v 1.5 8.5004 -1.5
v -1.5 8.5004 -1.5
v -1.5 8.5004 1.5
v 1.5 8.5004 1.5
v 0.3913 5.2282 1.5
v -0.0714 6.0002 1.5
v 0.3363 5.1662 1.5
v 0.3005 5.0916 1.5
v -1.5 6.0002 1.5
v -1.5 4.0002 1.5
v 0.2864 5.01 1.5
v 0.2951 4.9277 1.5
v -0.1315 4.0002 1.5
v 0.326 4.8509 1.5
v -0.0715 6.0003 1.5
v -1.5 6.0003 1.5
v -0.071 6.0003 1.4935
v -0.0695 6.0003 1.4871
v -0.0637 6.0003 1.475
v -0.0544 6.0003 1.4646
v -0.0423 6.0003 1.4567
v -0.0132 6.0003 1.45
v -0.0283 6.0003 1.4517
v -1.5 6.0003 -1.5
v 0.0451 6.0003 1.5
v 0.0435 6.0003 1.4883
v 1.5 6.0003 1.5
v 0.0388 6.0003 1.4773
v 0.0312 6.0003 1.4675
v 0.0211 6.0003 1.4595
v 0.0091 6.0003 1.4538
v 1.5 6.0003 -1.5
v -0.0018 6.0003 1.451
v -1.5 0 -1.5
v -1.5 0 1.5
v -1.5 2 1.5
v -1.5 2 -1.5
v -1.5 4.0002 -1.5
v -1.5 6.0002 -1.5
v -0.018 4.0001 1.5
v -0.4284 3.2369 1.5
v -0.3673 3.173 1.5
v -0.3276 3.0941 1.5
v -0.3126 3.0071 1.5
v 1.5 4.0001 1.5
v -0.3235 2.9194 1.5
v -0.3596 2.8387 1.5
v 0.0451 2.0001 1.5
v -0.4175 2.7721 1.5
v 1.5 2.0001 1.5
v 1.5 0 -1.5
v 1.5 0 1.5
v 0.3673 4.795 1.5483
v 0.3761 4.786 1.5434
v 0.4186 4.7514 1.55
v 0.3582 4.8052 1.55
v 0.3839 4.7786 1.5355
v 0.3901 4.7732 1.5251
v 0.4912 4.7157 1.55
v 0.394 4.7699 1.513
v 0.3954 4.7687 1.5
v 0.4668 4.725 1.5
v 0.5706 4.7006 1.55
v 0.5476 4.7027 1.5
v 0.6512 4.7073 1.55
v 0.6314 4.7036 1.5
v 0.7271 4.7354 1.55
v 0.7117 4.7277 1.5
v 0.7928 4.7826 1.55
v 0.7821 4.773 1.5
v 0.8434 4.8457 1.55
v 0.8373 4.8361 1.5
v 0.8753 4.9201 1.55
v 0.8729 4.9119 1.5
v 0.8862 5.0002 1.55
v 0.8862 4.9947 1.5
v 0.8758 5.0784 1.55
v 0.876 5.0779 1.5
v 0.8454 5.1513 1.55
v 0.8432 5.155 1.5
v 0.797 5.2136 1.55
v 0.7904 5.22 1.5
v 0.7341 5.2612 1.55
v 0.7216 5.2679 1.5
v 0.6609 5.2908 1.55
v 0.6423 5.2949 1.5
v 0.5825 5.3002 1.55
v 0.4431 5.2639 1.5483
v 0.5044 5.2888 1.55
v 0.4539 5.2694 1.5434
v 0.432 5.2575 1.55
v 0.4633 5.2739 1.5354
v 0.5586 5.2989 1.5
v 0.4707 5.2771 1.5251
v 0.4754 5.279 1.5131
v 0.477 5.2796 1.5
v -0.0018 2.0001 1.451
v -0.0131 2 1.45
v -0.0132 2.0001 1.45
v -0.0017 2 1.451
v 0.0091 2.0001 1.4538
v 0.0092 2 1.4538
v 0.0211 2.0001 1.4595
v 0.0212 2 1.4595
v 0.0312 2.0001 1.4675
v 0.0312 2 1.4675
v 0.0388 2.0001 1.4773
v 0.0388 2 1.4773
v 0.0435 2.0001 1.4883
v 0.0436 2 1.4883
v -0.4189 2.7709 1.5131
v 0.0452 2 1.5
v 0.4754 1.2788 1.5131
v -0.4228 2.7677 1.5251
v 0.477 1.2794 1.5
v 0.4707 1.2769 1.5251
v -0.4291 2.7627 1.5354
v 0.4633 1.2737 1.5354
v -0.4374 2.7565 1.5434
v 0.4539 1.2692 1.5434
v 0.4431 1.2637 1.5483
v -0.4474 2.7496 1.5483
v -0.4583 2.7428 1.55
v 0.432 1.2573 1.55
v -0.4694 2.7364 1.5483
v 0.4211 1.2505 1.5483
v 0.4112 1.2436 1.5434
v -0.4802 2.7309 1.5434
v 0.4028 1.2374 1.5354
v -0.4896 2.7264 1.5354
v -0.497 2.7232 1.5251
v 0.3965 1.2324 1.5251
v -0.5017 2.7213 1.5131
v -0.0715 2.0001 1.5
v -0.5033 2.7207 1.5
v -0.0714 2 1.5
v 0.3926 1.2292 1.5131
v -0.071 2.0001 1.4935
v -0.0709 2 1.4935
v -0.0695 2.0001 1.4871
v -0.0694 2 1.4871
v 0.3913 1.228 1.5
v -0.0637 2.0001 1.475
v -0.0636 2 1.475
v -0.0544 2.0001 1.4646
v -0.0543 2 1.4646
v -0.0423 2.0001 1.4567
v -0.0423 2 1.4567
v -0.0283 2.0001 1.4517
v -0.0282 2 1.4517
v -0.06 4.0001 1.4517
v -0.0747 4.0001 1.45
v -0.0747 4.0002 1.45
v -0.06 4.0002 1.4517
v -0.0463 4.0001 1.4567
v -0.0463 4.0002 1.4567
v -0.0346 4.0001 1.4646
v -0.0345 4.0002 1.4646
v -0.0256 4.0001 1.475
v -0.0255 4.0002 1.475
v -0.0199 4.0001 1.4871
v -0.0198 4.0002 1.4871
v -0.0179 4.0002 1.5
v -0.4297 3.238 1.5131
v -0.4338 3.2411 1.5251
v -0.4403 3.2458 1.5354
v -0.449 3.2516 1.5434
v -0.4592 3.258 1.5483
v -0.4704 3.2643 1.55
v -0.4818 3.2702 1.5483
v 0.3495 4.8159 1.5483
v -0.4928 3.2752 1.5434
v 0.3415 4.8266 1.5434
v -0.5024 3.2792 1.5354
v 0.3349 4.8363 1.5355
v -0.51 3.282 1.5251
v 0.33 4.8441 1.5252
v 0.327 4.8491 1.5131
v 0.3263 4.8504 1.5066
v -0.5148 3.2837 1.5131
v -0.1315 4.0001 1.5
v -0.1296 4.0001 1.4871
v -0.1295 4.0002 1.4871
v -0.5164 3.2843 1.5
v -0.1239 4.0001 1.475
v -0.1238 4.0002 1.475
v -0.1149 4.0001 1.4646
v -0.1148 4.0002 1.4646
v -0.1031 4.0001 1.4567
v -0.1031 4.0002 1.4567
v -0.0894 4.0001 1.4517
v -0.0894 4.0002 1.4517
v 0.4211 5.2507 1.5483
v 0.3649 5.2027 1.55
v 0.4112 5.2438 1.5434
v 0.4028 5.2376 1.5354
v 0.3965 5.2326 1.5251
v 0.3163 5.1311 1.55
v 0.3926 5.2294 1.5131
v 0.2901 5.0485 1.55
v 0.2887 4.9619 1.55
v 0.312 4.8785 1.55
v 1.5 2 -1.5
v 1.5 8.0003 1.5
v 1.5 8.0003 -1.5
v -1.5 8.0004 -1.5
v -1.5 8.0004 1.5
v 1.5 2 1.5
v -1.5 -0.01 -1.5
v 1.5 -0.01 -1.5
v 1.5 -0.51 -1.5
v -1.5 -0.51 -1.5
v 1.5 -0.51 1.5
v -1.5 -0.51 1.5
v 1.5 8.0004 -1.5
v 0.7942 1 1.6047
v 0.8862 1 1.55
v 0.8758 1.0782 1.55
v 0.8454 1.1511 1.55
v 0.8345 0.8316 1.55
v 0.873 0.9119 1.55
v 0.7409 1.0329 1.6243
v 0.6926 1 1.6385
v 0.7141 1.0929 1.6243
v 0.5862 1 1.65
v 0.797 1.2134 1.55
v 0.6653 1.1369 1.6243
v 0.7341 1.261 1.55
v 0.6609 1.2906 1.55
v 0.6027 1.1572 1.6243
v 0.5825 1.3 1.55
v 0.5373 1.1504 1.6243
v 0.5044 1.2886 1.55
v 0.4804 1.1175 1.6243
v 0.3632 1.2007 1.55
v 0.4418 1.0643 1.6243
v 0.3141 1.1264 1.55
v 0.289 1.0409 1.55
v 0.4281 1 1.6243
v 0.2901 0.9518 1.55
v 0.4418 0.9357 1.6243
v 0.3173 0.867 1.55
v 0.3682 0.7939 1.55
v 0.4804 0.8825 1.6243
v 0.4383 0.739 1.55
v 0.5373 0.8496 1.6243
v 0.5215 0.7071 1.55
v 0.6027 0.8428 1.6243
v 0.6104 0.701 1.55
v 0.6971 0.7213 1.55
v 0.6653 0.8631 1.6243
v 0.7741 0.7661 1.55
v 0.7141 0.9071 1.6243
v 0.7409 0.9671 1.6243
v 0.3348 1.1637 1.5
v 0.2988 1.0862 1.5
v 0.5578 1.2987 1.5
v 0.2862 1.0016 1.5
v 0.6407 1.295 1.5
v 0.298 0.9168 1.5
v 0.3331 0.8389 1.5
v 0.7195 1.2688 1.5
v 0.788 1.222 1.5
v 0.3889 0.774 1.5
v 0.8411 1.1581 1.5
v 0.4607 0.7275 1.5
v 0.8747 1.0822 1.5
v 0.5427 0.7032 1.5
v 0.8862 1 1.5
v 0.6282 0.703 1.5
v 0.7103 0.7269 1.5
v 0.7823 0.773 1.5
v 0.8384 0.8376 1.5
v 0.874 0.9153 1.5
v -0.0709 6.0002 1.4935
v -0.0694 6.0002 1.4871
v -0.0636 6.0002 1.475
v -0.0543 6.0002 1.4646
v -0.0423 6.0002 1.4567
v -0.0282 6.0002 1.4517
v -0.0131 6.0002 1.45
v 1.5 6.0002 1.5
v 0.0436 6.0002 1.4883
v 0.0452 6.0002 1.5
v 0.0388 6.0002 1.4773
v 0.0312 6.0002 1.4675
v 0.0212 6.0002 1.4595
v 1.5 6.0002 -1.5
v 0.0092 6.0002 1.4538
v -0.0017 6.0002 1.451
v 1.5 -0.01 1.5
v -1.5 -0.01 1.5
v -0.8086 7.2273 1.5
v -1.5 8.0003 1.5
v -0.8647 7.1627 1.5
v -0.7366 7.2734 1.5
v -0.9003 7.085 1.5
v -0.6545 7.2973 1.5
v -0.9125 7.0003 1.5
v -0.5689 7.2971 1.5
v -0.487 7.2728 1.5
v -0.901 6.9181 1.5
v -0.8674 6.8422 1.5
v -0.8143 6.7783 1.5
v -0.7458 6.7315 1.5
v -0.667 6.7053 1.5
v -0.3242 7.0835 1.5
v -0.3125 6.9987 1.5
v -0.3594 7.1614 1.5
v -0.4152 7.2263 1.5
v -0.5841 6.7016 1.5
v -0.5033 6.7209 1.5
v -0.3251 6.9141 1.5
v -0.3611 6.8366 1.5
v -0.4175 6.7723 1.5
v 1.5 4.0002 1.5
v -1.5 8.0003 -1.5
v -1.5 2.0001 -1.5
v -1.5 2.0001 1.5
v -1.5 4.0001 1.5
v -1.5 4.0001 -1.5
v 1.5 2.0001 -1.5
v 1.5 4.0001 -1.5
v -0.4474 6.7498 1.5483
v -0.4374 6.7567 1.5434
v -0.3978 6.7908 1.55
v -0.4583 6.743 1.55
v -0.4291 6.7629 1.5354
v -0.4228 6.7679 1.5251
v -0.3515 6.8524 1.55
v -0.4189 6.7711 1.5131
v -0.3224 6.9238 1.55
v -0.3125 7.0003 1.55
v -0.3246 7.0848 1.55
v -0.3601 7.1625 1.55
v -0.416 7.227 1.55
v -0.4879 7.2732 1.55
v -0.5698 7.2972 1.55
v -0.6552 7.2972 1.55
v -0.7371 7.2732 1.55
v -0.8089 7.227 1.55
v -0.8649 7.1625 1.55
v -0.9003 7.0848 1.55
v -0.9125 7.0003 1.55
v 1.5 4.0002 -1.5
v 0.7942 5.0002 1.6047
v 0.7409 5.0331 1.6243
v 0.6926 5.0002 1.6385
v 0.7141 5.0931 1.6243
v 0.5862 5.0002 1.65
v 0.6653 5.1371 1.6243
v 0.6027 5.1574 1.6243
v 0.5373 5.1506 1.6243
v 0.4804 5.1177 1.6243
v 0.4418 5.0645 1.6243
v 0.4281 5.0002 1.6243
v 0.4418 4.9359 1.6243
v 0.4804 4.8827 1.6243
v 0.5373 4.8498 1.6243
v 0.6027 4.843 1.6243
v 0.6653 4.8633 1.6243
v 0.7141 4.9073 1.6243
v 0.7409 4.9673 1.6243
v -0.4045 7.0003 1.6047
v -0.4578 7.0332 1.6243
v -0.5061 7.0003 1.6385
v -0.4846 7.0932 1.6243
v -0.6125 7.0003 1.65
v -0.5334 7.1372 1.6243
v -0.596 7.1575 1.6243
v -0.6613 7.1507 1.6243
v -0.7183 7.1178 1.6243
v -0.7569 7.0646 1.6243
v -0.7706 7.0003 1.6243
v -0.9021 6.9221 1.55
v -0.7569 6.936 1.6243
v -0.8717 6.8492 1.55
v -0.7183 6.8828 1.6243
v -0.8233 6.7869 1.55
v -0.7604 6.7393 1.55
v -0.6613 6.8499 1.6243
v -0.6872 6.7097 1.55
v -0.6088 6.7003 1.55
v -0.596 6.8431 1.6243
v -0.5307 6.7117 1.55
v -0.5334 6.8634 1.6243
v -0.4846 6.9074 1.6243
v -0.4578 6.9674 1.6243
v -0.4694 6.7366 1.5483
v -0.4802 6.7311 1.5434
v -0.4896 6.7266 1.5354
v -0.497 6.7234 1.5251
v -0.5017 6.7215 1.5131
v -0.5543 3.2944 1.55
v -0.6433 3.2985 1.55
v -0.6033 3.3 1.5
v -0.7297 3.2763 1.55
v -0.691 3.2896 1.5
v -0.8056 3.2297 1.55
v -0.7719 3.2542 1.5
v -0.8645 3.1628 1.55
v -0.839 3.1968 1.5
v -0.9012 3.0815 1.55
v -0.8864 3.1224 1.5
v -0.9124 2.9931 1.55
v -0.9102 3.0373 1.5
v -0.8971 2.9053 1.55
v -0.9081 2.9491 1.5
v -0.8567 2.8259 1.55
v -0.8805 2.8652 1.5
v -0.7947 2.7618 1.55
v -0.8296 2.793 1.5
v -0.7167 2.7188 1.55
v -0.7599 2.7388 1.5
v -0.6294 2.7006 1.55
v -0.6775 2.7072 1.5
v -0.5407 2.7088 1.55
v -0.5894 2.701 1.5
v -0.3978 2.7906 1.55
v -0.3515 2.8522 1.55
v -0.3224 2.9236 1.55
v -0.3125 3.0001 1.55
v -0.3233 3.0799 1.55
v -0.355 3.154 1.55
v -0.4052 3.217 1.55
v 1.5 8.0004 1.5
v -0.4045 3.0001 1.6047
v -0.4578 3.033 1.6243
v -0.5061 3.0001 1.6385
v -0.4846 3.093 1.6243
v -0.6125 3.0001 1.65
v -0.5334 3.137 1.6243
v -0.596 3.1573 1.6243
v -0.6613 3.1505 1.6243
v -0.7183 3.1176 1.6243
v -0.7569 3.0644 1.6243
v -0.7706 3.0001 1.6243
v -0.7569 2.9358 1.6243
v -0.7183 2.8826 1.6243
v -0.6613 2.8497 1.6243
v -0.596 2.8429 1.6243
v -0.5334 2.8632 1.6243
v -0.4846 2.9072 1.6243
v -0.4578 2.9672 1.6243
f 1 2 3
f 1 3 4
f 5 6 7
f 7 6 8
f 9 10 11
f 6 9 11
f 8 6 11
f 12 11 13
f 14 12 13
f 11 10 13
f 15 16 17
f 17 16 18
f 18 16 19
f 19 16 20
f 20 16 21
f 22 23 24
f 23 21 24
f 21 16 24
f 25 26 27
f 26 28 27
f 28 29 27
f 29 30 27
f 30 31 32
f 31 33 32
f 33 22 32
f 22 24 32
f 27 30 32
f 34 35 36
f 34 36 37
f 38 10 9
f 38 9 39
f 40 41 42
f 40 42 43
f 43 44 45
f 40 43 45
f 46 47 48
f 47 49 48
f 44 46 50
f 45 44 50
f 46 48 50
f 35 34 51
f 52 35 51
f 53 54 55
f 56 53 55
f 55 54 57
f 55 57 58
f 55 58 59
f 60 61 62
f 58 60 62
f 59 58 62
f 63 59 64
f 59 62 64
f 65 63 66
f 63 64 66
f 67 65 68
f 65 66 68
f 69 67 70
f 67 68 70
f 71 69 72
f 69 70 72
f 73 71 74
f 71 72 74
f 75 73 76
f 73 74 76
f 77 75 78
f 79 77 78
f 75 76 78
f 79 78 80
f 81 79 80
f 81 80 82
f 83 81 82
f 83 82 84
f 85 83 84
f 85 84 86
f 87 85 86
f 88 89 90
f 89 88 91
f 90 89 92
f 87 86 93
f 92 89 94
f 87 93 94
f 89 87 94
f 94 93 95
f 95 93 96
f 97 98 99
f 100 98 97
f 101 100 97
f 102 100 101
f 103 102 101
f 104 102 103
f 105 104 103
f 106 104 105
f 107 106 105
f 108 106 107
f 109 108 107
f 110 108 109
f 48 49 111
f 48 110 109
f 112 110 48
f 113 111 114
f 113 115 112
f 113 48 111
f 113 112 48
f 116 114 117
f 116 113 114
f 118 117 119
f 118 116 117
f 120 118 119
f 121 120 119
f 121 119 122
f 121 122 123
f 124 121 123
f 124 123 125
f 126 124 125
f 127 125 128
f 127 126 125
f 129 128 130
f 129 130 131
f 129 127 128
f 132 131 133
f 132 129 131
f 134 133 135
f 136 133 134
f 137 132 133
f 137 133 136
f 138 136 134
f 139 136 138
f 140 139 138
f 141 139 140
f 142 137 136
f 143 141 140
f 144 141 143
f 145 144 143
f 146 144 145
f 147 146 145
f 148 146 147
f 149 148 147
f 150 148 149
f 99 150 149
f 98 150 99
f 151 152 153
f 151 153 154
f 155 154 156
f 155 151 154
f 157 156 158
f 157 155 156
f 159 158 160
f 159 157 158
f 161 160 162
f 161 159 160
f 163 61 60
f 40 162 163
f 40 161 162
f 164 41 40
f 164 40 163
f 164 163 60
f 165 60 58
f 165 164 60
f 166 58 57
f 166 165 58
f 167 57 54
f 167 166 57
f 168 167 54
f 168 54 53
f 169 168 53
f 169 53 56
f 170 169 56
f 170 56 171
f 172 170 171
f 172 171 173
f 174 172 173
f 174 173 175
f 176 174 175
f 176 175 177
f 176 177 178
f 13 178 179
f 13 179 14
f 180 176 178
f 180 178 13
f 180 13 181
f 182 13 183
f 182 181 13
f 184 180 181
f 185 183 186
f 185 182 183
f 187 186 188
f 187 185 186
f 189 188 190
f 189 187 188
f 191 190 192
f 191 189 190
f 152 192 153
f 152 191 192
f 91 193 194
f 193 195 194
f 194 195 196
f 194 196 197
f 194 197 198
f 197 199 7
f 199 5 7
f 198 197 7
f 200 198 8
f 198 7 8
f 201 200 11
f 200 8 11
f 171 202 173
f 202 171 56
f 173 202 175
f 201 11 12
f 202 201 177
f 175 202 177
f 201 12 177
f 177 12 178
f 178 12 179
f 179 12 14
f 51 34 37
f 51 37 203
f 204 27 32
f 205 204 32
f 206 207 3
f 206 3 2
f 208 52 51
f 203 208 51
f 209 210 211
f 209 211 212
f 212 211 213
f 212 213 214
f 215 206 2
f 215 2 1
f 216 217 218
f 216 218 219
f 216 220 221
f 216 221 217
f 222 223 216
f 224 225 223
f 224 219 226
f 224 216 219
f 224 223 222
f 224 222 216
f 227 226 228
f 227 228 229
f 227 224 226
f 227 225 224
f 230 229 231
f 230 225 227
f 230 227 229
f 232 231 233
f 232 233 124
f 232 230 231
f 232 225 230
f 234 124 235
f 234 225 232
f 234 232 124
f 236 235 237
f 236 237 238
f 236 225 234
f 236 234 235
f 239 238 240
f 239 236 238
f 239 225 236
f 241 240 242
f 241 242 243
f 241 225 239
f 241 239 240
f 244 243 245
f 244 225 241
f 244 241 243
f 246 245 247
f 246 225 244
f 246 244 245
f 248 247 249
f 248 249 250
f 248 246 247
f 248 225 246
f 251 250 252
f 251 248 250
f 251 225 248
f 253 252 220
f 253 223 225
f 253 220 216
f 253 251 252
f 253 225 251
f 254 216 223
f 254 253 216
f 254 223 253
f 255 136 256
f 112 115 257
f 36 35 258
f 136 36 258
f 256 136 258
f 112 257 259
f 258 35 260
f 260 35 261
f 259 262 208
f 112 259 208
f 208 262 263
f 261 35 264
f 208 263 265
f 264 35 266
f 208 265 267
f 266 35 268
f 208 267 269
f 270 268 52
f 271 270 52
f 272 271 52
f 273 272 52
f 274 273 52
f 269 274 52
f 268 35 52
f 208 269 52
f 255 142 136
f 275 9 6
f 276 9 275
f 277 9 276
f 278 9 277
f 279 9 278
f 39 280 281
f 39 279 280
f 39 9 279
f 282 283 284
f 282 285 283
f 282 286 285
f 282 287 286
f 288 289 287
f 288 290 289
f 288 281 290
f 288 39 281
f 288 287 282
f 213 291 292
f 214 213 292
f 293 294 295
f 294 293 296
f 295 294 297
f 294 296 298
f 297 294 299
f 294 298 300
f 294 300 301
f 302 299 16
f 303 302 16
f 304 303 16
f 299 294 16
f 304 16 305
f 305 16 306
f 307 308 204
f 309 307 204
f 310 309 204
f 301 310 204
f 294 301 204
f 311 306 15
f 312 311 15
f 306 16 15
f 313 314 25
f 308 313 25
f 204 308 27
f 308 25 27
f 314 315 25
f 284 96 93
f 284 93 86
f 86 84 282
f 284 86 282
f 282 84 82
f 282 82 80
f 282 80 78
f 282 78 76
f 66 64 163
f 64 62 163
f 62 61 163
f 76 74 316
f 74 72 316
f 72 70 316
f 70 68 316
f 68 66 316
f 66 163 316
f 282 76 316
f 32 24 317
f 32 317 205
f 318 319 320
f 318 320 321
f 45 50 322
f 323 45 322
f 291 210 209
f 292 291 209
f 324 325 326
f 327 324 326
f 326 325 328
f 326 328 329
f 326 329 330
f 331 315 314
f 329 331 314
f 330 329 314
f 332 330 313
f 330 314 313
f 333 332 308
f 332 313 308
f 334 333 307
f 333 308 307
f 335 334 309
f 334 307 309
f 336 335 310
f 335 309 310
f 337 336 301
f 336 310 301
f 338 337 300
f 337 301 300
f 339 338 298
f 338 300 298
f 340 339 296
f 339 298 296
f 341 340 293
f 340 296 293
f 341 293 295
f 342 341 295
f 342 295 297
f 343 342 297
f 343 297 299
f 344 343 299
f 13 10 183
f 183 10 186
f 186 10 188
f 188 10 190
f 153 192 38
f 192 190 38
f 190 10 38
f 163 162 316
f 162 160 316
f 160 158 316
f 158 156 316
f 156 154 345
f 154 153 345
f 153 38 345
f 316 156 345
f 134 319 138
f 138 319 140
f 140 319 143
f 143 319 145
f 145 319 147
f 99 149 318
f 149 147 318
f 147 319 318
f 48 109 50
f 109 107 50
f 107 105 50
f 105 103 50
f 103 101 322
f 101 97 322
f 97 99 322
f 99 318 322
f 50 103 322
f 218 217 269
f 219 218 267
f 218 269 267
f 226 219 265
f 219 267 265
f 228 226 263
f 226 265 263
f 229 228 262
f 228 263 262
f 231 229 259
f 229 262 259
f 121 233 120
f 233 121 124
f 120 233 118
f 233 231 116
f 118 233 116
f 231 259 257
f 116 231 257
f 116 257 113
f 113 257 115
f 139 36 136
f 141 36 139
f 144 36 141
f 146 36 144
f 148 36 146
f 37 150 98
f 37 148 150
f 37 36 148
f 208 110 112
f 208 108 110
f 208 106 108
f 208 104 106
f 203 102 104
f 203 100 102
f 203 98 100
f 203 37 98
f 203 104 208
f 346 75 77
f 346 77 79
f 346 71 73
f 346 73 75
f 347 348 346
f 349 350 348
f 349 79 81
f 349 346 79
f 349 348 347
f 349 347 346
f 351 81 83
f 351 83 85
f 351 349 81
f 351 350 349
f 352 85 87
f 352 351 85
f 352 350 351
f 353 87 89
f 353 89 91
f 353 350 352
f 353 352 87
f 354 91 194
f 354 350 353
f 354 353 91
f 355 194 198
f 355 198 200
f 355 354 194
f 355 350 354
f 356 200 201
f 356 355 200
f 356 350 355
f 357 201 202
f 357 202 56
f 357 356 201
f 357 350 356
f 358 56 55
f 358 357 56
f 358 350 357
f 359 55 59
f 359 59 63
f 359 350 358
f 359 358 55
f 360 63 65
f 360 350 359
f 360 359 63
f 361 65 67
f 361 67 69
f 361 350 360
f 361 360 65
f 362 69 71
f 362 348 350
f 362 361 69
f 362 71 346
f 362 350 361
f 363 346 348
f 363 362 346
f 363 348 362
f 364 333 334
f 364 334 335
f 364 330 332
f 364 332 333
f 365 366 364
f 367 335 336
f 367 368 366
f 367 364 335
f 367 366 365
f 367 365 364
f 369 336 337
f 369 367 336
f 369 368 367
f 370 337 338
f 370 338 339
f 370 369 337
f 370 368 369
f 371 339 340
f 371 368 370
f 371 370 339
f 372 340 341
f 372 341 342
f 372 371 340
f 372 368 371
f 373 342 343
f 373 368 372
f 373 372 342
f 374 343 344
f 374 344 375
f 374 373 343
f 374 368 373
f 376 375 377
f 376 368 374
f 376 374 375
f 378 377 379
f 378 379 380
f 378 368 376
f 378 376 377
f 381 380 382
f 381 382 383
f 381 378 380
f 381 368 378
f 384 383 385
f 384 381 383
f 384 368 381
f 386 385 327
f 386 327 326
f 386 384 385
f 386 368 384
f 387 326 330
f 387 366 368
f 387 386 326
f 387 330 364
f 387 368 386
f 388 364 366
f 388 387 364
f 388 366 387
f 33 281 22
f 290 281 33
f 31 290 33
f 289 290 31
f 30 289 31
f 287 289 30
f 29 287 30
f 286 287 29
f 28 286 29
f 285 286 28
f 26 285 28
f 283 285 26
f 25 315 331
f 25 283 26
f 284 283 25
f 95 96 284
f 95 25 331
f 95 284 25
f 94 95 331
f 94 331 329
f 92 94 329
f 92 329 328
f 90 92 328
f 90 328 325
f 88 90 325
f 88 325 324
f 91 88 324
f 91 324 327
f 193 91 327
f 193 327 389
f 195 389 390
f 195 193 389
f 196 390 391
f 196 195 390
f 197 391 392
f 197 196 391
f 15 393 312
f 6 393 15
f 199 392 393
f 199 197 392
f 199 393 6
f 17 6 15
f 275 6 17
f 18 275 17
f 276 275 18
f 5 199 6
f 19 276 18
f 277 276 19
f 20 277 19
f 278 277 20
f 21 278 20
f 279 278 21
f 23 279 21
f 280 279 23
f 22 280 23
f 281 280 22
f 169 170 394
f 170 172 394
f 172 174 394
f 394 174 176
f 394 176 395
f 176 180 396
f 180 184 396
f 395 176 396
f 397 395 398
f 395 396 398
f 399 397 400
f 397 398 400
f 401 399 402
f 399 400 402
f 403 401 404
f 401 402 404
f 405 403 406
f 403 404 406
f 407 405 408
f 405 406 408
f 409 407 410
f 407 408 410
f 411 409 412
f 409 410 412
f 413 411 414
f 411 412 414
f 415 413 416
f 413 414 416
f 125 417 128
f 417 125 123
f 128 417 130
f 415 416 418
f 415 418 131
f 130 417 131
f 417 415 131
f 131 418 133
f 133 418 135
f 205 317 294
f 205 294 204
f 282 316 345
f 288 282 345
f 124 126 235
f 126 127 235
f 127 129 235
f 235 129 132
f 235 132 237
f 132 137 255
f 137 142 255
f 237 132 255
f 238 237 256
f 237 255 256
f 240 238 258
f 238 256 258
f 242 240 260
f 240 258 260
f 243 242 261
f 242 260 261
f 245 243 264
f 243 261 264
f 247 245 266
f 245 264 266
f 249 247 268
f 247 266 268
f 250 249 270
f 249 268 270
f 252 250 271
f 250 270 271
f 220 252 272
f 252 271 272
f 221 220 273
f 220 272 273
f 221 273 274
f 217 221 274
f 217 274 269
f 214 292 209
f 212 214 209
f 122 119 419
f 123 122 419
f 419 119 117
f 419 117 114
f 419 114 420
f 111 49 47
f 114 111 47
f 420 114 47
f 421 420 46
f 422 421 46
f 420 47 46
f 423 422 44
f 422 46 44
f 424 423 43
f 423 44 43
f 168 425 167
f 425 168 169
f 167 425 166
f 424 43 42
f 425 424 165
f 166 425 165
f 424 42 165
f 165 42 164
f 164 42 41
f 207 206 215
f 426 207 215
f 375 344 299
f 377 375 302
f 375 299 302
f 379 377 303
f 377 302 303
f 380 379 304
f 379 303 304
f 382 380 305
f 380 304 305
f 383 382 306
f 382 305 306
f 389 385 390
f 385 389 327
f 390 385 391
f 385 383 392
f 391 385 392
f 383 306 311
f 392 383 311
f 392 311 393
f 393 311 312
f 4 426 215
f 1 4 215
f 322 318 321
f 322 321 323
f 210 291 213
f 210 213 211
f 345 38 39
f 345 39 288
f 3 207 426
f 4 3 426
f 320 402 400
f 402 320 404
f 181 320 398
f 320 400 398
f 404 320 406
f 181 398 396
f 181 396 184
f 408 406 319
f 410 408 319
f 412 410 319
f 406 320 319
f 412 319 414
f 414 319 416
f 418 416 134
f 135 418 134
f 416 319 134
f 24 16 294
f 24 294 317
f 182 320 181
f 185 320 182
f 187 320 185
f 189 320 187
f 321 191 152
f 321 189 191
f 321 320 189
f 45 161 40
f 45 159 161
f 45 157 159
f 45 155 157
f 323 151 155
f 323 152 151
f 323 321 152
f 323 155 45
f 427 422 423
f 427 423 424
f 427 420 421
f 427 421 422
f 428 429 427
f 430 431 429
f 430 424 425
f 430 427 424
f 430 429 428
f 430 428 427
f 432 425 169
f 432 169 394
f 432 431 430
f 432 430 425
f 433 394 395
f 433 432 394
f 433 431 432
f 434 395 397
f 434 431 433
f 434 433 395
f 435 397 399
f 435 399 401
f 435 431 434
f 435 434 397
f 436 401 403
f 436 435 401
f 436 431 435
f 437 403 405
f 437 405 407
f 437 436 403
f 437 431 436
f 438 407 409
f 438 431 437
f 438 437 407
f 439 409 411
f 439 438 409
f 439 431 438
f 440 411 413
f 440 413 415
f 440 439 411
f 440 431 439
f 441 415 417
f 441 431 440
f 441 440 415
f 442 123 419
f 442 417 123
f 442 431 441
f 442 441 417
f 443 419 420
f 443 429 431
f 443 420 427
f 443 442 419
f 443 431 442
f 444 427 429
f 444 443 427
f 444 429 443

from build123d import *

# Parameters (mm, degrees)
SKETCH1_W           = 3
SKETCH1_H           = 3
BOSS_EXTRUDE1_DEPTH = 2
LPATTERN3_COUNT     = 4
LPATTERN3_PITCH     = 2.0001
SKETCH2_W           = 3
SKETCH2_H           = 3
BOSS_EXTRUDE2_DEPTH = 0.5
SKETCH7_R           = 0.3
BOSS_EXTRUDE6_DEPTH = 0.05
DOME1_FACE_RADIUS   = 0.3
DOME1_HEIGHT        = 0.1
DOME5_FACE_RADIUS   = 0.3
DOME5_HEIGHT        = 0.1
DOME6_FACE_RADIUS   = 0.3
DOME6_HEIGHT        = 0.1
DOME7_FACE_RADIUS   = 0.3
DOME7_HEIGHT        = 0.1
SKETCH9_R           = 0.05
SKETCH34_W          = 3
SKETCH34_H          = 3
BOSS_EXTRUDE7_DEPTH = 0.5


with BuildPart() as part:
    # Sketch1 → Boss-Extrude1 (new body)
    with BuildSketch(Plane(origin=(0, 0, 0), x_dir=(1, 0, 0), z_dir=(0, 1, 0))):
        Rectangle(SKETCH1_W, SKETCH1_H)
    extrude(amount=BOSS_EXTRUDE1_DEPTH)


with BuildPart() as lpattern3_1:
    # LPattern3: pattern copy
    add(part.part.moved(Location(Vector(0, 1, 0) * (1 * LPATTERN3_PITCH))))


with BuildPart() as lpattern3_2:
    # LPattern3: pattern copy
    add(part.part.moved(Location(Vector(0, 1, 0) * (2 * LPATTERN3_PITCH))))


with BuildPart() as lpattern3_3:
    # LPattern3: pattern copy
    add(part.part.moved(Location(Vector(0, 1, 0) * (3 * LPATTERN3_PITCH))))

    # Sketch7 → Boss-Extrude6 (add)
    with BuildSketch(Plane.XY.offset(1.5)):
        with Locations(Location((-0.612484748, 7.0003, 0), (0, 0, 180))):
            Circle(SKETCH7_R)
        with Locations((0.586205547, 5.0002)):
            Circle(SKETCH7_R)
        with Locations((-0.612484748, 3.0001)):
            Circle(SKETCH7_R)
        with Locations((0.586205547, 1)):
            Circle(SKETCH7_R)
    extrude(amount=BOSS_EXTRUDE6_DEPTH)


with BuildPart() as body_5:
    # Sketch2 → Boss-Extrude2 (new body)
    with BuildSketch(Plane(origin=(0, -0.01, 0), x_dir=(-1, 0, 0), z_dir=(0, -1, 0))):
        Rectangle(SKETCH2_W, SKETCH2_H)
    extrude(amount=BOSS_EXTRUDE2_DEPTH)


with BuildPart() as boss_extrude6_piece_1:
    # of the separate pieces the step leaves, piece 1, a body of its own (boss_extrude6_pieces)
    add(lpattern3_3.part.solids().sort_by_distance((-1.5, 6.0003, -1.5))[0])

    # Dome1: a dome of height H over a round flat face of radius A is a cap of a sphere of radius (A * A + H * H) / (2 * H)
    dome1_r = (DOME1_FACE_RADIUS * DOME1_FACE_RADIUS + DOME1_HEIGHT * DOME1_HEIGHT) / (2 * DOME1_HEIGHT)
    dome1_base = Plane((-0.612484748, 7.0003, 1.55), z_dir=(0, 0, 1))
    with Locations(dome1_base.offset(DOME1_HEIGHT - dome1_r)):
        dome1_ball = Sphere(dome1_r, mode=Mode.PRIVATE)
    add(split(dome1_ball, bisect_by=dome1_base, keep=Keep.TOP, mode=Mode.PRIVATE))


with BuildPart() as boss_extrude6_piece_2:
    # of the separate pieces the step leaves, piece 2, a body of its own (boss_extrude6_pieces)
    add(lpattern3_3.part.solids().sort_by_distance((0.886205547, 5.0002, 1.5))[0])

    # Dome5: a dome of height H over a round flat face of radius A is a cap of a sphere of radius (A * A + H * H) / (2 * H)
    dome5_r = (DOME5_FACE_RADIUS * DOME5_FACE_RADIUS + DOME5_HEIGHT * DOME5_HEIGHT) / (2 * DOME5_HEIGHT)
    dome5_base = Plane((0.586205547, 5.0002, 1.55), z_dir=(0, 0, 1))
    with Locations(dome5_base.offset(DOME5_HEIGHT - dome5_r)):
        dome5_ball = Sphere(dome5_r, mode=Mode.PRIVATE)
    add(split(dome5_ball, bisect_by=dome5_base, keep=Keep.TOP, mode=Mode.PRIVATE))


with BuildPart() as boss_extrude6_piece_3:
    # of the separate pieces the step leaves, piece 3, a body of its own (boss_extrude6_pieces)
    add(lpattern3_3.part.solids().sort_by_distance((0.886205547, 1, 1.5))[0])

    # Dome7: a dome of height H over a round flat face of radius A is a cap of a sphere of radius (A * A + H * H) / (2 * H)
    dome7_r = (DOME7_FACE_RADIUS * DOME7_FACE_RADIUS + DOME7_HEIGHT * DOME7_HEIGHT) / (2 * DOME7_HEIGHT)
    dome7_base = Plane((0.586205547, 1, 1.55), z_dir=(0, 0, 1))
    with Locations(dome7_base.offset(DOME7_HEIGHT - dome7_r)):
        dome7_ball = Sphere(dome7_r, mode=Mode.PRIVATE)
    add(split(dome7_ball, bisect_by=dome7_base, keep=Keep.TOP, mode=Mode.PRIVATE))


with BuildPart() as boss_extrude6_piece_4:
    # of the separate pieces the step leaves, piece 4, a body of its own (boss_extrude6_pieces)
    add(lpattern3_3.part.solids().sort_by_distance((-0.312484748, 3.0001, 1.5))[0])

    # Dome6: a dome of height H over a round flat face of radius A is a cap of a sphere of radius (A * A + H * H) / (2 * H)
    dome6_r = (DOME6_FACE_RADIUS * DOME6_FACE_RADIUS + DOME6_HEIGHT * DOME6_HEIGHT) / (2 * DOME6_HEIGHT)
    dome6_base = Plane((-0.612484748, 3.0001, 1.55), z_dir=(0, 0, 1))
    with Locations(dome6_base.offset(DOME6_HEIGHT - dome6_r)):
        dome6_ball = Sphere(dome6_r, mode=Mode.PRIVATE)
    add(split(dome6_ball, bisect_by=dome6_base, keep=Keep.TOP, mode=Mode.PRIVATE))


with BuildPart() as part_1:
    add(part.part)

    add(lpattern3_1.part)  # Sweep1 merges LPattern3_1

    add(lpattern3_2.part)  # Sweep1 merges LPattern3_2

    add(boss_extrude6_piece_1.part)  # Sweep1 merges Boss-Extrude6 piece 1

    add(boss_extrude6_piece_2.part)  # Sweep1 merges Boss-Extrude6 piece 2

    add(boss_extrude6_piece_3.part)  # Sweep1 merges Boss-Extrude6 piece 3

    add(boss_extrude6_piece_4.part)  # Sweep1 merges Boss-Extrude6 piece 4
    # Sweep1: sweep along a path in Sketch8
    with BuildLine(Plane.XY.offset(1.5)) as sweep1_path:
        Line((-0.612484748, 7.0003), (0.521304183, 5.108492541))
        Line((0.521304183, 5.108492541), (-0.612484748, 3.0001))
        Line((-0.612484748, 3.0001), (0.586205547, 1))
    # Sketch9 → Sweep1 (sweep)
    with BuildSketch(Plane(origin=(-0.612484748, 7.0003, 1.5), x_dir=(0, 0, -1), z_dir=(0.5140637754126949, -0.8577519657852418, 0))):
        Circle(SKETCH9_R)
    sweep(path=sweep1_path.line, transition=Transition.RIGHT)


with BuildPart() as body_3:
    # Sketch34 → Boss-Extrude7 (new body)
    with BuildSketch(Plane(origin=(0, 8.0004, 0), x_dir=(1, 0, 0), z_dir=(0, 1, 0))):
        Rectangle(SKETCH34_W, SKETCH34_H)
    extrude(amount=BOSS_EXTRUDE7_DEPTH)


solid = Compound([body_5.part, part_1.part, body_3.part])
